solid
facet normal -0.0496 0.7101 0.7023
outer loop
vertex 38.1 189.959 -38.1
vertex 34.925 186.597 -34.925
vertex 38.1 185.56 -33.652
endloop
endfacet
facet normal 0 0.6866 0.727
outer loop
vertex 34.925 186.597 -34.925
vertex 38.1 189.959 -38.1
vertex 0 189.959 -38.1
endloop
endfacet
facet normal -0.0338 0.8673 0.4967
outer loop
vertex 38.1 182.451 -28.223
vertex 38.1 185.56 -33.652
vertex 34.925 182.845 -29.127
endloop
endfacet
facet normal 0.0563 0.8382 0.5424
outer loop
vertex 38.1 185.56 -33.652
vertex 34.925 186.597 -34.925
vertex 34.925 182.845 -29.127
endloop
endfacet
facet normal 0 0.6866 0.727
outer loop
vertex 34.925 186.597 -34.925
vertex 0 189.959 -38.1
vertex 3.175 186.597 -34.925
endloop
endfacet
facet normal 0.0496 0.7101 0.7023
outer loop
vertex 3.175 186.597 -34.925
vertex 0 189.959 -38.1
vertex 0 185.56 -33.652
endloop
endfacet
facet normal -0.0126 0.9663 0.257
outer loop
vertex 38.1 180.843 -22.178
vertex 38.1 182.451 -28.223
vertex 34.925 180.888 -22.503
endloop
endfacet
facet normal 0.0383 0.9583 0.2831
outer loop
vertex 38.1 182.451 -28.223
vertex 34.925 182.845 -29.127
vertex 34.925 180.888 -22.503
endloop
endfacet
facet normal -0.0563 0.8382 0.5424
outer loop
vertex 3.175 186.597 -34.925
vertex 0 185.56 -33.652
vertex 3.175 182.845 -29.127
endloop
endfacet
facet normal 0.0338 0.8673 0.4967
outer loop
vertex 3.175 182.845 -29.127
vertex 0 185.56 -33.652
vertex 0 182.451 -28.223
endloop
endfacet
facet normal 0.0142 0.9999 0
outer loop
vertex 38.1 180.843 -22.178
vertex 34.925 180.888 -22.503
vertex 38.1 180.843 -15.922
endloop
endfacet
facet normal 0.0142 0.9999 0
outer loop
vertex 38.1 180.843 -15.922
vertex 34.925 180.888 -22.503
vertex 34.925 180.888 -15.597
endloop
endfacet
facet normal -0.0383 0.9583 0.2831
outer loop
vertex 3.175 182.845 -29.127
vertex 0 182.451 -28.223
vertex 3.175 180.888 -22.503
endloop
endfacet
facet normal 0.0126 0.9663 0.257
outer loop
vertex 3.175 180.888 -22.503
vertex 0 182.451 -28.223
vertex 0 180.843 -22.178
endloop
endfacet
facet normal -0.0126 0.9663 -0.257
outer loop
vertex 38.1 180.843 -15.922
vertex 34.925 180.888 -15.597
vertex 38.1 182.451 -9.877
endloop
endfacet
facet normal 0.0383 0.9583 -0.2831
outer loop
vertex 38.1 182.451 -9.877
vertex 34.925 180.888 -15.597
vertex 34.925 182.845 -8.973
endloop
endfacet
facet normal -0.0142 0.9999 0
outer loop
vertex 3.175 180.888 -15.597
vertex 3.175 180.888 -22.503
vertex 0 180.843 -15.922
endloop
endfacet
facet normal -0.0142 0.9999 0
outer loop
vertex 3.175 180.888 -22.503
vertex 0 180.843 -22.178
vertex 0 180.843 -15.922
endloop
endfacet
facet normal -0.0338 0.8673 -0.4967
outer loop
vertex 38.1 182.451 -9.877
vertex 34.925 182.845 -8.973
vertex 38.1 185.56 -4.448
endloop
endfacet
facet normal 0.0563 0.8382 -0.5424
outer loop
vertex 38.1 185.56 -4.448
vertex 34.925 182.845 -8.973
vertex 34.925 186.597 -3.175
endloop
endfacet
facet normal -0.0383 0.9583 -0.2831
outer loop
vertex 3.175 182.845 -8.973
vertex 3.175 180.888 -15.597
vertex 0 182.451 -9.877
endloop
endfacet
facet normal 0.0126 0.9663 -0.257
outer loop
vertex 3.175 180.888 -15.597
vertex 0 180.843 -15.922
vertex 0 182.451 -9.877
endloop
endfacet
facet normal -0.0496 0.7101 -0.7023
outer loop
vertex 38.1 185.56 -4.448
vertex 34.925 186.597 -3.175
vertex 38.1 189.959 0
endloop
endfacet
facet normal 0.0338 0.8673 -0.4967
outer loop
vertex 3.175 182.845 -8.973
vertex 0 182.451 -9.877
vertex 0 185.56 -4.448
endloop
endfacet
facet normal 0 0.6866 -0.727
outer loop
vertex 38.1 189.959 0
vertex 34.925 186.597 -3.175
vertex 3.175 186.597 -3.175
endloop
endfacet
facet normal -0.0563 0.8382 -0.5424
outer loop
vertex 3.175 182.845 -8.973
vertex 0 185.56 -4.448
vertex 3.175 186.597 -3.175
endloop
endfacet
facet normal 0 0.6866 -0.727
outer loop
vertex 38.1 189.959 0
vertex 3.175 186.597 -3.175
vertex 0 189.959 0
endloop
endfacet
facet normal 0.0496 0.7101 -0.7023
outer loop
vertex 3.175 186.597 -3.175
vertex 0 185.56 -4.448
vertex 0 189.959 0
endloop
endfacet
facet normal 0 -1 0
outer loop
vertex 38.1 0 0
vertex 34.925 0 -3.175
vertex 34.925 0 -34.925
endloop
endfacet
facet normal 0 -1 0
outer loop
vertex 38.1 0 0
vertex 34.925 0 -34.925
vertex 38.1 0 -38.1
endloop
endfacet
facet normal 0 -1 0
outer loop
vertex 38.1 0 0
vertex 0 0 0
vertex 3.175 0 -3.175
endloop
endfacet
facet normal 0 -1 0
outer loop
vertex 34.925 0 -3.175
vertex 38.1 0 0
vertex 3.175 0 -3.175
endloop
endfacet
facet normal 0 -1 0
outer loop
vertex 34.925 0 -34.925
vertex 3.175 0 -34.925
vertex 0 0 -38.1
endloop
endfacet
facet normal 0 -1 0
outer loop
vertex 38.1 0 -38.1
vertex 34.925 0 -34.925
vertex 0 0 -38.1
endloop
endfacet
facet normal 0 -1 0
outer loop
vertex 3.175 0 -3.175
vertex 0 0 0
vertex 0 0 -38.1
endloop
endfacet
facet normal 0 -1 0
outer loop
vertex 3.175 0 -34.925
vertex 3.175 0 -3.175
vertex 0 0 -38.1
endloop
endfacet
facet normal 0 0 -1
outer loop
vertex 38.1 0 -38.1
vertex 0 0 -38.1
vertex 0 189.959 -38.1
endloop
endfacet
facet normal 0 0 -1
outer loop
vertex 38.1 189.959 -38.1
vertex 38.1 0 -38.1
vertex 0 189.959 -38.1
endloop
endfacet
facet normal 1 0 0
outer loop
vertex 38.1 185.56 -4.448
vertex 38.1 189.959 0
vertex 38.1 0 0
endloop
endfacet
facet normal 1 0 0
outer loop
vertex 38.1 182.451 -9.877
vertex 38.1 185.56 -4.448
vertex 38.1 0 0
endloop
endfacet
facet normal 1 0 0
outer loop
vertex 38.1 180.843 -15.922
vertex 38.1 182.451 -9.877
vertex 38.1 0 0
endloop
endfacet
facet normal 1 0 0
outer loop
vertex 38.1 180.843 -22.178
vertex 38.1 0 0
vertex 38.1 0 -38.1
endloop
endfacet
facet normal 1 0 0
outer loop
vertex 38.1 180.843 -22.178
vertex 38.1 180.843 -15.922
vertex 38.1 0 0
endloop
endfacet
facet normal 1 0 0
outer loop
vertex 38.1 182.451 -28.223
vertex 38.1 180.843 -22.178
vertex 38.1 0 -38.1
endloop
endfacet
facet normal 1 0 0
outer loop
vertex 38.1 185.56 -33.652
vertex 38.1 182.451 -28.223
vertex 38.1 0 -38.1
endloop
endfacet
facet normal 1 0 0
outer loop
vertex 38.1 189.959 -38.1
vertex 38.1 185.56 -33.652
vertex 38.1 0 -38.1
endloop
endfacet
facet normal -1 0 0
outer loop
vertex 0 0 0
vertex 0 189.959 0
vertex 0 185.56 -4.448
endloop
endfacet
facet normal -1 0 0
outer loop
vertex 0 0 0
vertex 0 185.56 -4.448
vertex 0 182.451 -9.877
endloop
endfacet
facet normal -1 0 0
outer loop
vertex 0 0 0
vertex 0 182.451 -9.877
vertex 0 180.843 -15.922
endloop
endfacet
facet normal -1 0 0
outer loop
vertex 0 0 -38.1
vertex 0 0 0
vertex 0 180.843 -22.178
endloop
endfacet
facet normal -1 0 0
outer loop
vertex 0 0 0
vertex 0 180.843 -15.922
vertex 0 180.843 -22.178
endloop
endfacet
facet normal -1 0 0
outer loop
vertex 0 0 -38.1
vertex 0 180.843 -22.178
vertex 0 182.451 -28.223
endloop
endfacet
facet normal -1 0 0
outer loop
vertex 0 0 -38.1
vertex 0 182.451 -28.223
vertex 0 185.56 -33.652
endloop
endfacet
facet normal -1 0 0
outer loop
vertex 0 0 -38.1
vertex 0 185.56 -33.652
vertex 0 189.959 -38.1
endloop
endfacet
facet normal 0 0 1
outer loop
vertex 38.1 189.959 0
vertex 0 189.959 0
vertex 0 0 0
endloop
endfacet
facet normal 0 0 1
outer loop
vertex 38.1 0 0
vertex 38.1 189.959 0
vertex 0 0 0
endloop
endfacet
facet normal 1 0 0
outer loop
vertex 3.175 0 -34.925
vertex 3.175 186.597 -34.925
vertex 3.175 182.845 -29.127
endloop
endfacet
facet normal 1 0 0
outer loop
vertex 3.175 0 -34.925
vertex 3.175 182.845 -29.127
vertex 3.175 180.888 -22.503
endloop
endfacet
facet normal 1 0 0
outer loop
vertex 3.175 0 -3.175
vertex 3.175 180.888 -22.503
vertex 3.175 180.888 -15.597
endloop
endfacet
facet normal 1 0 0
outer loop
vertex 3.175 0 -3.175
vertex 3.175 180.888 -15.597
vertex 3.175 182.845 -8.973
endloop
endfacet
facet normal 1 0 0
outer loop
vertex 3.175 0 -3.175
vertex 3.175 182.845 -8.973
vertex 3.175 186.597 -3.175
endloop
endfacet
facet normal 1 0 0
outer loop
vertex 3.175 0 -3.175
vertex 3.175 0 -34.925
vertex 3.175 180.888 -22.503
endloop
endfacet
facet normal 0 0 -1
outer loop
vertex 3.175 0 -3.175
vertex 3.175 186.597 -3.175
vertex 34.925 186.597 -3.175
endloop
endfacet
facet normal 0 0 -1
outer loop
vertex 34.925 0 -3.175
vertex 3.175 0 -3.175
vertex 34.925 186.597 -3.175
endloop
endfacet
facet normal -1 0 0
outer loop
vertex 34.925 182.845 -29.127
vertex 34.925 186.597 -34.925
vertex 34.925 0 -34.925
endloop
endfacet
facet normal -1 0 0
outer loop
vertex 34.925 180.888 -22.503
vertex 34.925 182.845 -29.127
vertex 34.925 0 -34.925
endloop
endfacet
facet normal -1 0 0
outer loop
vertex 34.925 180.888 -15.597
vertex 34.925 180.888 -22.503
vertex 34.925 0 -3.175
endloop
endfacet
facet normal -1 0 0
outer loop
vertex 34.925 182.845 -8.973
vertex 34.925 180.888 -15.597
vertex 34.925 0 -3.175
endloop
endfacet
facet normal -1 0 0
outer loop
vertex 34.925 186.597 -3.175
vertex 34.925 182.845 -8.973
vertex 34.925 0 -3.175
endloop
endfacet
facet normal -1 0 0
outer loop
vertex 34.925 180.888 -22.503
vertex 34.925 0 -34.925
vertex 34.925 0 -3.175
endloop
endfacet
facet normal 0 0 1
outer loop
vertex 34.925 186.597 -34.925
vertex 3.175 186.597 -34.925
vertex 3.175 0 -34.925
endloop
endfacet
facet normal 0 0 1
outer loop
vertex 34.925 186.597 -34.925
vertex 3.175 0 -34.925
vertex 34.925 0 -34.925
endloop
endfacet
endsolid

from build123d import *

# Parameters (mm, degrees)
BOSS_EXTRUDE1_DEPTH = 38.1
SKETCH2_W           = 31.75
SKETCH2_H           = 31.75
CUT_EXTRUDE1_DEPTH  = 198.452983021


with BuildPart() as part:
    # Sketch1 → Boss-Extrude1 (new body)
    with BuildSketch(Plane(origin=(0, 0, 0), x_dir=(0, 0, -1), z_dir=(1, 0, 0))):
        with BuildLine():
            Line((0, 189.959102187), (0, 0))
            Line((0, 0), (38.1, 0))
            Line((38.1, 0), (38.1, 189.959102187))
            ThreePointArc((38.1, 189.959102187), (19.05, 180.63972), (0, 189.959102187))
        make_face()
    extrude(amount=BOSS_EXTRUDE1_DEPTH)

    # Sketch2 → Cut-Extrude1 (cut, through all)
    with BuildSketch(Plane.XZ):
        with Locations((19.05, -19.05)):
            Rectangle(SKETCH2_W, SKETCH2_H)
    extrude(amount=-CUT_EXTRUDE1_DEPTH, mode=Mode.SUBTRACT)


solid = part.part
